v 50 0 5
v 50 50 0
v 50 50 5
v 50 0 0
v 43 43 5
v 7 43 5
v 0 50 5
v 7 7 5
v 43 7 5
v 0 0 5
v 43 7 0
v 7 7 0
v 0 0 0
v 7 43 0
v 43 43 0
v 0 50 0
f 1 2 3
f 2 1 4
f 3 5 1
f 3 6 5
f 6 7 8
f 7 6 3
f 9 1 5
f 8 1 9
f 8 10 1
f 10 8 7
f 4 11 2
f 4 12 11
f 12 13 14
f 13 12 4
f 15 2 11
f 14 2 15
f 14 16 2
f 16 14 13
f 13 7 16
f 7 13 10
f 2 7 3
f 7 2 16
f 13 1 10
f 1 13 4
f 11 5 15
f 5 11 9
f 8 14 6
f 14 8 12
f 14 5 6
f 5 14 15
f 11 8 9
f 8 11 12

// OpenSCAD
difference() {
cube([50, 50, 5]);
translate([7, 7, -.01]) cube([36, 36, 5.02]);
}
